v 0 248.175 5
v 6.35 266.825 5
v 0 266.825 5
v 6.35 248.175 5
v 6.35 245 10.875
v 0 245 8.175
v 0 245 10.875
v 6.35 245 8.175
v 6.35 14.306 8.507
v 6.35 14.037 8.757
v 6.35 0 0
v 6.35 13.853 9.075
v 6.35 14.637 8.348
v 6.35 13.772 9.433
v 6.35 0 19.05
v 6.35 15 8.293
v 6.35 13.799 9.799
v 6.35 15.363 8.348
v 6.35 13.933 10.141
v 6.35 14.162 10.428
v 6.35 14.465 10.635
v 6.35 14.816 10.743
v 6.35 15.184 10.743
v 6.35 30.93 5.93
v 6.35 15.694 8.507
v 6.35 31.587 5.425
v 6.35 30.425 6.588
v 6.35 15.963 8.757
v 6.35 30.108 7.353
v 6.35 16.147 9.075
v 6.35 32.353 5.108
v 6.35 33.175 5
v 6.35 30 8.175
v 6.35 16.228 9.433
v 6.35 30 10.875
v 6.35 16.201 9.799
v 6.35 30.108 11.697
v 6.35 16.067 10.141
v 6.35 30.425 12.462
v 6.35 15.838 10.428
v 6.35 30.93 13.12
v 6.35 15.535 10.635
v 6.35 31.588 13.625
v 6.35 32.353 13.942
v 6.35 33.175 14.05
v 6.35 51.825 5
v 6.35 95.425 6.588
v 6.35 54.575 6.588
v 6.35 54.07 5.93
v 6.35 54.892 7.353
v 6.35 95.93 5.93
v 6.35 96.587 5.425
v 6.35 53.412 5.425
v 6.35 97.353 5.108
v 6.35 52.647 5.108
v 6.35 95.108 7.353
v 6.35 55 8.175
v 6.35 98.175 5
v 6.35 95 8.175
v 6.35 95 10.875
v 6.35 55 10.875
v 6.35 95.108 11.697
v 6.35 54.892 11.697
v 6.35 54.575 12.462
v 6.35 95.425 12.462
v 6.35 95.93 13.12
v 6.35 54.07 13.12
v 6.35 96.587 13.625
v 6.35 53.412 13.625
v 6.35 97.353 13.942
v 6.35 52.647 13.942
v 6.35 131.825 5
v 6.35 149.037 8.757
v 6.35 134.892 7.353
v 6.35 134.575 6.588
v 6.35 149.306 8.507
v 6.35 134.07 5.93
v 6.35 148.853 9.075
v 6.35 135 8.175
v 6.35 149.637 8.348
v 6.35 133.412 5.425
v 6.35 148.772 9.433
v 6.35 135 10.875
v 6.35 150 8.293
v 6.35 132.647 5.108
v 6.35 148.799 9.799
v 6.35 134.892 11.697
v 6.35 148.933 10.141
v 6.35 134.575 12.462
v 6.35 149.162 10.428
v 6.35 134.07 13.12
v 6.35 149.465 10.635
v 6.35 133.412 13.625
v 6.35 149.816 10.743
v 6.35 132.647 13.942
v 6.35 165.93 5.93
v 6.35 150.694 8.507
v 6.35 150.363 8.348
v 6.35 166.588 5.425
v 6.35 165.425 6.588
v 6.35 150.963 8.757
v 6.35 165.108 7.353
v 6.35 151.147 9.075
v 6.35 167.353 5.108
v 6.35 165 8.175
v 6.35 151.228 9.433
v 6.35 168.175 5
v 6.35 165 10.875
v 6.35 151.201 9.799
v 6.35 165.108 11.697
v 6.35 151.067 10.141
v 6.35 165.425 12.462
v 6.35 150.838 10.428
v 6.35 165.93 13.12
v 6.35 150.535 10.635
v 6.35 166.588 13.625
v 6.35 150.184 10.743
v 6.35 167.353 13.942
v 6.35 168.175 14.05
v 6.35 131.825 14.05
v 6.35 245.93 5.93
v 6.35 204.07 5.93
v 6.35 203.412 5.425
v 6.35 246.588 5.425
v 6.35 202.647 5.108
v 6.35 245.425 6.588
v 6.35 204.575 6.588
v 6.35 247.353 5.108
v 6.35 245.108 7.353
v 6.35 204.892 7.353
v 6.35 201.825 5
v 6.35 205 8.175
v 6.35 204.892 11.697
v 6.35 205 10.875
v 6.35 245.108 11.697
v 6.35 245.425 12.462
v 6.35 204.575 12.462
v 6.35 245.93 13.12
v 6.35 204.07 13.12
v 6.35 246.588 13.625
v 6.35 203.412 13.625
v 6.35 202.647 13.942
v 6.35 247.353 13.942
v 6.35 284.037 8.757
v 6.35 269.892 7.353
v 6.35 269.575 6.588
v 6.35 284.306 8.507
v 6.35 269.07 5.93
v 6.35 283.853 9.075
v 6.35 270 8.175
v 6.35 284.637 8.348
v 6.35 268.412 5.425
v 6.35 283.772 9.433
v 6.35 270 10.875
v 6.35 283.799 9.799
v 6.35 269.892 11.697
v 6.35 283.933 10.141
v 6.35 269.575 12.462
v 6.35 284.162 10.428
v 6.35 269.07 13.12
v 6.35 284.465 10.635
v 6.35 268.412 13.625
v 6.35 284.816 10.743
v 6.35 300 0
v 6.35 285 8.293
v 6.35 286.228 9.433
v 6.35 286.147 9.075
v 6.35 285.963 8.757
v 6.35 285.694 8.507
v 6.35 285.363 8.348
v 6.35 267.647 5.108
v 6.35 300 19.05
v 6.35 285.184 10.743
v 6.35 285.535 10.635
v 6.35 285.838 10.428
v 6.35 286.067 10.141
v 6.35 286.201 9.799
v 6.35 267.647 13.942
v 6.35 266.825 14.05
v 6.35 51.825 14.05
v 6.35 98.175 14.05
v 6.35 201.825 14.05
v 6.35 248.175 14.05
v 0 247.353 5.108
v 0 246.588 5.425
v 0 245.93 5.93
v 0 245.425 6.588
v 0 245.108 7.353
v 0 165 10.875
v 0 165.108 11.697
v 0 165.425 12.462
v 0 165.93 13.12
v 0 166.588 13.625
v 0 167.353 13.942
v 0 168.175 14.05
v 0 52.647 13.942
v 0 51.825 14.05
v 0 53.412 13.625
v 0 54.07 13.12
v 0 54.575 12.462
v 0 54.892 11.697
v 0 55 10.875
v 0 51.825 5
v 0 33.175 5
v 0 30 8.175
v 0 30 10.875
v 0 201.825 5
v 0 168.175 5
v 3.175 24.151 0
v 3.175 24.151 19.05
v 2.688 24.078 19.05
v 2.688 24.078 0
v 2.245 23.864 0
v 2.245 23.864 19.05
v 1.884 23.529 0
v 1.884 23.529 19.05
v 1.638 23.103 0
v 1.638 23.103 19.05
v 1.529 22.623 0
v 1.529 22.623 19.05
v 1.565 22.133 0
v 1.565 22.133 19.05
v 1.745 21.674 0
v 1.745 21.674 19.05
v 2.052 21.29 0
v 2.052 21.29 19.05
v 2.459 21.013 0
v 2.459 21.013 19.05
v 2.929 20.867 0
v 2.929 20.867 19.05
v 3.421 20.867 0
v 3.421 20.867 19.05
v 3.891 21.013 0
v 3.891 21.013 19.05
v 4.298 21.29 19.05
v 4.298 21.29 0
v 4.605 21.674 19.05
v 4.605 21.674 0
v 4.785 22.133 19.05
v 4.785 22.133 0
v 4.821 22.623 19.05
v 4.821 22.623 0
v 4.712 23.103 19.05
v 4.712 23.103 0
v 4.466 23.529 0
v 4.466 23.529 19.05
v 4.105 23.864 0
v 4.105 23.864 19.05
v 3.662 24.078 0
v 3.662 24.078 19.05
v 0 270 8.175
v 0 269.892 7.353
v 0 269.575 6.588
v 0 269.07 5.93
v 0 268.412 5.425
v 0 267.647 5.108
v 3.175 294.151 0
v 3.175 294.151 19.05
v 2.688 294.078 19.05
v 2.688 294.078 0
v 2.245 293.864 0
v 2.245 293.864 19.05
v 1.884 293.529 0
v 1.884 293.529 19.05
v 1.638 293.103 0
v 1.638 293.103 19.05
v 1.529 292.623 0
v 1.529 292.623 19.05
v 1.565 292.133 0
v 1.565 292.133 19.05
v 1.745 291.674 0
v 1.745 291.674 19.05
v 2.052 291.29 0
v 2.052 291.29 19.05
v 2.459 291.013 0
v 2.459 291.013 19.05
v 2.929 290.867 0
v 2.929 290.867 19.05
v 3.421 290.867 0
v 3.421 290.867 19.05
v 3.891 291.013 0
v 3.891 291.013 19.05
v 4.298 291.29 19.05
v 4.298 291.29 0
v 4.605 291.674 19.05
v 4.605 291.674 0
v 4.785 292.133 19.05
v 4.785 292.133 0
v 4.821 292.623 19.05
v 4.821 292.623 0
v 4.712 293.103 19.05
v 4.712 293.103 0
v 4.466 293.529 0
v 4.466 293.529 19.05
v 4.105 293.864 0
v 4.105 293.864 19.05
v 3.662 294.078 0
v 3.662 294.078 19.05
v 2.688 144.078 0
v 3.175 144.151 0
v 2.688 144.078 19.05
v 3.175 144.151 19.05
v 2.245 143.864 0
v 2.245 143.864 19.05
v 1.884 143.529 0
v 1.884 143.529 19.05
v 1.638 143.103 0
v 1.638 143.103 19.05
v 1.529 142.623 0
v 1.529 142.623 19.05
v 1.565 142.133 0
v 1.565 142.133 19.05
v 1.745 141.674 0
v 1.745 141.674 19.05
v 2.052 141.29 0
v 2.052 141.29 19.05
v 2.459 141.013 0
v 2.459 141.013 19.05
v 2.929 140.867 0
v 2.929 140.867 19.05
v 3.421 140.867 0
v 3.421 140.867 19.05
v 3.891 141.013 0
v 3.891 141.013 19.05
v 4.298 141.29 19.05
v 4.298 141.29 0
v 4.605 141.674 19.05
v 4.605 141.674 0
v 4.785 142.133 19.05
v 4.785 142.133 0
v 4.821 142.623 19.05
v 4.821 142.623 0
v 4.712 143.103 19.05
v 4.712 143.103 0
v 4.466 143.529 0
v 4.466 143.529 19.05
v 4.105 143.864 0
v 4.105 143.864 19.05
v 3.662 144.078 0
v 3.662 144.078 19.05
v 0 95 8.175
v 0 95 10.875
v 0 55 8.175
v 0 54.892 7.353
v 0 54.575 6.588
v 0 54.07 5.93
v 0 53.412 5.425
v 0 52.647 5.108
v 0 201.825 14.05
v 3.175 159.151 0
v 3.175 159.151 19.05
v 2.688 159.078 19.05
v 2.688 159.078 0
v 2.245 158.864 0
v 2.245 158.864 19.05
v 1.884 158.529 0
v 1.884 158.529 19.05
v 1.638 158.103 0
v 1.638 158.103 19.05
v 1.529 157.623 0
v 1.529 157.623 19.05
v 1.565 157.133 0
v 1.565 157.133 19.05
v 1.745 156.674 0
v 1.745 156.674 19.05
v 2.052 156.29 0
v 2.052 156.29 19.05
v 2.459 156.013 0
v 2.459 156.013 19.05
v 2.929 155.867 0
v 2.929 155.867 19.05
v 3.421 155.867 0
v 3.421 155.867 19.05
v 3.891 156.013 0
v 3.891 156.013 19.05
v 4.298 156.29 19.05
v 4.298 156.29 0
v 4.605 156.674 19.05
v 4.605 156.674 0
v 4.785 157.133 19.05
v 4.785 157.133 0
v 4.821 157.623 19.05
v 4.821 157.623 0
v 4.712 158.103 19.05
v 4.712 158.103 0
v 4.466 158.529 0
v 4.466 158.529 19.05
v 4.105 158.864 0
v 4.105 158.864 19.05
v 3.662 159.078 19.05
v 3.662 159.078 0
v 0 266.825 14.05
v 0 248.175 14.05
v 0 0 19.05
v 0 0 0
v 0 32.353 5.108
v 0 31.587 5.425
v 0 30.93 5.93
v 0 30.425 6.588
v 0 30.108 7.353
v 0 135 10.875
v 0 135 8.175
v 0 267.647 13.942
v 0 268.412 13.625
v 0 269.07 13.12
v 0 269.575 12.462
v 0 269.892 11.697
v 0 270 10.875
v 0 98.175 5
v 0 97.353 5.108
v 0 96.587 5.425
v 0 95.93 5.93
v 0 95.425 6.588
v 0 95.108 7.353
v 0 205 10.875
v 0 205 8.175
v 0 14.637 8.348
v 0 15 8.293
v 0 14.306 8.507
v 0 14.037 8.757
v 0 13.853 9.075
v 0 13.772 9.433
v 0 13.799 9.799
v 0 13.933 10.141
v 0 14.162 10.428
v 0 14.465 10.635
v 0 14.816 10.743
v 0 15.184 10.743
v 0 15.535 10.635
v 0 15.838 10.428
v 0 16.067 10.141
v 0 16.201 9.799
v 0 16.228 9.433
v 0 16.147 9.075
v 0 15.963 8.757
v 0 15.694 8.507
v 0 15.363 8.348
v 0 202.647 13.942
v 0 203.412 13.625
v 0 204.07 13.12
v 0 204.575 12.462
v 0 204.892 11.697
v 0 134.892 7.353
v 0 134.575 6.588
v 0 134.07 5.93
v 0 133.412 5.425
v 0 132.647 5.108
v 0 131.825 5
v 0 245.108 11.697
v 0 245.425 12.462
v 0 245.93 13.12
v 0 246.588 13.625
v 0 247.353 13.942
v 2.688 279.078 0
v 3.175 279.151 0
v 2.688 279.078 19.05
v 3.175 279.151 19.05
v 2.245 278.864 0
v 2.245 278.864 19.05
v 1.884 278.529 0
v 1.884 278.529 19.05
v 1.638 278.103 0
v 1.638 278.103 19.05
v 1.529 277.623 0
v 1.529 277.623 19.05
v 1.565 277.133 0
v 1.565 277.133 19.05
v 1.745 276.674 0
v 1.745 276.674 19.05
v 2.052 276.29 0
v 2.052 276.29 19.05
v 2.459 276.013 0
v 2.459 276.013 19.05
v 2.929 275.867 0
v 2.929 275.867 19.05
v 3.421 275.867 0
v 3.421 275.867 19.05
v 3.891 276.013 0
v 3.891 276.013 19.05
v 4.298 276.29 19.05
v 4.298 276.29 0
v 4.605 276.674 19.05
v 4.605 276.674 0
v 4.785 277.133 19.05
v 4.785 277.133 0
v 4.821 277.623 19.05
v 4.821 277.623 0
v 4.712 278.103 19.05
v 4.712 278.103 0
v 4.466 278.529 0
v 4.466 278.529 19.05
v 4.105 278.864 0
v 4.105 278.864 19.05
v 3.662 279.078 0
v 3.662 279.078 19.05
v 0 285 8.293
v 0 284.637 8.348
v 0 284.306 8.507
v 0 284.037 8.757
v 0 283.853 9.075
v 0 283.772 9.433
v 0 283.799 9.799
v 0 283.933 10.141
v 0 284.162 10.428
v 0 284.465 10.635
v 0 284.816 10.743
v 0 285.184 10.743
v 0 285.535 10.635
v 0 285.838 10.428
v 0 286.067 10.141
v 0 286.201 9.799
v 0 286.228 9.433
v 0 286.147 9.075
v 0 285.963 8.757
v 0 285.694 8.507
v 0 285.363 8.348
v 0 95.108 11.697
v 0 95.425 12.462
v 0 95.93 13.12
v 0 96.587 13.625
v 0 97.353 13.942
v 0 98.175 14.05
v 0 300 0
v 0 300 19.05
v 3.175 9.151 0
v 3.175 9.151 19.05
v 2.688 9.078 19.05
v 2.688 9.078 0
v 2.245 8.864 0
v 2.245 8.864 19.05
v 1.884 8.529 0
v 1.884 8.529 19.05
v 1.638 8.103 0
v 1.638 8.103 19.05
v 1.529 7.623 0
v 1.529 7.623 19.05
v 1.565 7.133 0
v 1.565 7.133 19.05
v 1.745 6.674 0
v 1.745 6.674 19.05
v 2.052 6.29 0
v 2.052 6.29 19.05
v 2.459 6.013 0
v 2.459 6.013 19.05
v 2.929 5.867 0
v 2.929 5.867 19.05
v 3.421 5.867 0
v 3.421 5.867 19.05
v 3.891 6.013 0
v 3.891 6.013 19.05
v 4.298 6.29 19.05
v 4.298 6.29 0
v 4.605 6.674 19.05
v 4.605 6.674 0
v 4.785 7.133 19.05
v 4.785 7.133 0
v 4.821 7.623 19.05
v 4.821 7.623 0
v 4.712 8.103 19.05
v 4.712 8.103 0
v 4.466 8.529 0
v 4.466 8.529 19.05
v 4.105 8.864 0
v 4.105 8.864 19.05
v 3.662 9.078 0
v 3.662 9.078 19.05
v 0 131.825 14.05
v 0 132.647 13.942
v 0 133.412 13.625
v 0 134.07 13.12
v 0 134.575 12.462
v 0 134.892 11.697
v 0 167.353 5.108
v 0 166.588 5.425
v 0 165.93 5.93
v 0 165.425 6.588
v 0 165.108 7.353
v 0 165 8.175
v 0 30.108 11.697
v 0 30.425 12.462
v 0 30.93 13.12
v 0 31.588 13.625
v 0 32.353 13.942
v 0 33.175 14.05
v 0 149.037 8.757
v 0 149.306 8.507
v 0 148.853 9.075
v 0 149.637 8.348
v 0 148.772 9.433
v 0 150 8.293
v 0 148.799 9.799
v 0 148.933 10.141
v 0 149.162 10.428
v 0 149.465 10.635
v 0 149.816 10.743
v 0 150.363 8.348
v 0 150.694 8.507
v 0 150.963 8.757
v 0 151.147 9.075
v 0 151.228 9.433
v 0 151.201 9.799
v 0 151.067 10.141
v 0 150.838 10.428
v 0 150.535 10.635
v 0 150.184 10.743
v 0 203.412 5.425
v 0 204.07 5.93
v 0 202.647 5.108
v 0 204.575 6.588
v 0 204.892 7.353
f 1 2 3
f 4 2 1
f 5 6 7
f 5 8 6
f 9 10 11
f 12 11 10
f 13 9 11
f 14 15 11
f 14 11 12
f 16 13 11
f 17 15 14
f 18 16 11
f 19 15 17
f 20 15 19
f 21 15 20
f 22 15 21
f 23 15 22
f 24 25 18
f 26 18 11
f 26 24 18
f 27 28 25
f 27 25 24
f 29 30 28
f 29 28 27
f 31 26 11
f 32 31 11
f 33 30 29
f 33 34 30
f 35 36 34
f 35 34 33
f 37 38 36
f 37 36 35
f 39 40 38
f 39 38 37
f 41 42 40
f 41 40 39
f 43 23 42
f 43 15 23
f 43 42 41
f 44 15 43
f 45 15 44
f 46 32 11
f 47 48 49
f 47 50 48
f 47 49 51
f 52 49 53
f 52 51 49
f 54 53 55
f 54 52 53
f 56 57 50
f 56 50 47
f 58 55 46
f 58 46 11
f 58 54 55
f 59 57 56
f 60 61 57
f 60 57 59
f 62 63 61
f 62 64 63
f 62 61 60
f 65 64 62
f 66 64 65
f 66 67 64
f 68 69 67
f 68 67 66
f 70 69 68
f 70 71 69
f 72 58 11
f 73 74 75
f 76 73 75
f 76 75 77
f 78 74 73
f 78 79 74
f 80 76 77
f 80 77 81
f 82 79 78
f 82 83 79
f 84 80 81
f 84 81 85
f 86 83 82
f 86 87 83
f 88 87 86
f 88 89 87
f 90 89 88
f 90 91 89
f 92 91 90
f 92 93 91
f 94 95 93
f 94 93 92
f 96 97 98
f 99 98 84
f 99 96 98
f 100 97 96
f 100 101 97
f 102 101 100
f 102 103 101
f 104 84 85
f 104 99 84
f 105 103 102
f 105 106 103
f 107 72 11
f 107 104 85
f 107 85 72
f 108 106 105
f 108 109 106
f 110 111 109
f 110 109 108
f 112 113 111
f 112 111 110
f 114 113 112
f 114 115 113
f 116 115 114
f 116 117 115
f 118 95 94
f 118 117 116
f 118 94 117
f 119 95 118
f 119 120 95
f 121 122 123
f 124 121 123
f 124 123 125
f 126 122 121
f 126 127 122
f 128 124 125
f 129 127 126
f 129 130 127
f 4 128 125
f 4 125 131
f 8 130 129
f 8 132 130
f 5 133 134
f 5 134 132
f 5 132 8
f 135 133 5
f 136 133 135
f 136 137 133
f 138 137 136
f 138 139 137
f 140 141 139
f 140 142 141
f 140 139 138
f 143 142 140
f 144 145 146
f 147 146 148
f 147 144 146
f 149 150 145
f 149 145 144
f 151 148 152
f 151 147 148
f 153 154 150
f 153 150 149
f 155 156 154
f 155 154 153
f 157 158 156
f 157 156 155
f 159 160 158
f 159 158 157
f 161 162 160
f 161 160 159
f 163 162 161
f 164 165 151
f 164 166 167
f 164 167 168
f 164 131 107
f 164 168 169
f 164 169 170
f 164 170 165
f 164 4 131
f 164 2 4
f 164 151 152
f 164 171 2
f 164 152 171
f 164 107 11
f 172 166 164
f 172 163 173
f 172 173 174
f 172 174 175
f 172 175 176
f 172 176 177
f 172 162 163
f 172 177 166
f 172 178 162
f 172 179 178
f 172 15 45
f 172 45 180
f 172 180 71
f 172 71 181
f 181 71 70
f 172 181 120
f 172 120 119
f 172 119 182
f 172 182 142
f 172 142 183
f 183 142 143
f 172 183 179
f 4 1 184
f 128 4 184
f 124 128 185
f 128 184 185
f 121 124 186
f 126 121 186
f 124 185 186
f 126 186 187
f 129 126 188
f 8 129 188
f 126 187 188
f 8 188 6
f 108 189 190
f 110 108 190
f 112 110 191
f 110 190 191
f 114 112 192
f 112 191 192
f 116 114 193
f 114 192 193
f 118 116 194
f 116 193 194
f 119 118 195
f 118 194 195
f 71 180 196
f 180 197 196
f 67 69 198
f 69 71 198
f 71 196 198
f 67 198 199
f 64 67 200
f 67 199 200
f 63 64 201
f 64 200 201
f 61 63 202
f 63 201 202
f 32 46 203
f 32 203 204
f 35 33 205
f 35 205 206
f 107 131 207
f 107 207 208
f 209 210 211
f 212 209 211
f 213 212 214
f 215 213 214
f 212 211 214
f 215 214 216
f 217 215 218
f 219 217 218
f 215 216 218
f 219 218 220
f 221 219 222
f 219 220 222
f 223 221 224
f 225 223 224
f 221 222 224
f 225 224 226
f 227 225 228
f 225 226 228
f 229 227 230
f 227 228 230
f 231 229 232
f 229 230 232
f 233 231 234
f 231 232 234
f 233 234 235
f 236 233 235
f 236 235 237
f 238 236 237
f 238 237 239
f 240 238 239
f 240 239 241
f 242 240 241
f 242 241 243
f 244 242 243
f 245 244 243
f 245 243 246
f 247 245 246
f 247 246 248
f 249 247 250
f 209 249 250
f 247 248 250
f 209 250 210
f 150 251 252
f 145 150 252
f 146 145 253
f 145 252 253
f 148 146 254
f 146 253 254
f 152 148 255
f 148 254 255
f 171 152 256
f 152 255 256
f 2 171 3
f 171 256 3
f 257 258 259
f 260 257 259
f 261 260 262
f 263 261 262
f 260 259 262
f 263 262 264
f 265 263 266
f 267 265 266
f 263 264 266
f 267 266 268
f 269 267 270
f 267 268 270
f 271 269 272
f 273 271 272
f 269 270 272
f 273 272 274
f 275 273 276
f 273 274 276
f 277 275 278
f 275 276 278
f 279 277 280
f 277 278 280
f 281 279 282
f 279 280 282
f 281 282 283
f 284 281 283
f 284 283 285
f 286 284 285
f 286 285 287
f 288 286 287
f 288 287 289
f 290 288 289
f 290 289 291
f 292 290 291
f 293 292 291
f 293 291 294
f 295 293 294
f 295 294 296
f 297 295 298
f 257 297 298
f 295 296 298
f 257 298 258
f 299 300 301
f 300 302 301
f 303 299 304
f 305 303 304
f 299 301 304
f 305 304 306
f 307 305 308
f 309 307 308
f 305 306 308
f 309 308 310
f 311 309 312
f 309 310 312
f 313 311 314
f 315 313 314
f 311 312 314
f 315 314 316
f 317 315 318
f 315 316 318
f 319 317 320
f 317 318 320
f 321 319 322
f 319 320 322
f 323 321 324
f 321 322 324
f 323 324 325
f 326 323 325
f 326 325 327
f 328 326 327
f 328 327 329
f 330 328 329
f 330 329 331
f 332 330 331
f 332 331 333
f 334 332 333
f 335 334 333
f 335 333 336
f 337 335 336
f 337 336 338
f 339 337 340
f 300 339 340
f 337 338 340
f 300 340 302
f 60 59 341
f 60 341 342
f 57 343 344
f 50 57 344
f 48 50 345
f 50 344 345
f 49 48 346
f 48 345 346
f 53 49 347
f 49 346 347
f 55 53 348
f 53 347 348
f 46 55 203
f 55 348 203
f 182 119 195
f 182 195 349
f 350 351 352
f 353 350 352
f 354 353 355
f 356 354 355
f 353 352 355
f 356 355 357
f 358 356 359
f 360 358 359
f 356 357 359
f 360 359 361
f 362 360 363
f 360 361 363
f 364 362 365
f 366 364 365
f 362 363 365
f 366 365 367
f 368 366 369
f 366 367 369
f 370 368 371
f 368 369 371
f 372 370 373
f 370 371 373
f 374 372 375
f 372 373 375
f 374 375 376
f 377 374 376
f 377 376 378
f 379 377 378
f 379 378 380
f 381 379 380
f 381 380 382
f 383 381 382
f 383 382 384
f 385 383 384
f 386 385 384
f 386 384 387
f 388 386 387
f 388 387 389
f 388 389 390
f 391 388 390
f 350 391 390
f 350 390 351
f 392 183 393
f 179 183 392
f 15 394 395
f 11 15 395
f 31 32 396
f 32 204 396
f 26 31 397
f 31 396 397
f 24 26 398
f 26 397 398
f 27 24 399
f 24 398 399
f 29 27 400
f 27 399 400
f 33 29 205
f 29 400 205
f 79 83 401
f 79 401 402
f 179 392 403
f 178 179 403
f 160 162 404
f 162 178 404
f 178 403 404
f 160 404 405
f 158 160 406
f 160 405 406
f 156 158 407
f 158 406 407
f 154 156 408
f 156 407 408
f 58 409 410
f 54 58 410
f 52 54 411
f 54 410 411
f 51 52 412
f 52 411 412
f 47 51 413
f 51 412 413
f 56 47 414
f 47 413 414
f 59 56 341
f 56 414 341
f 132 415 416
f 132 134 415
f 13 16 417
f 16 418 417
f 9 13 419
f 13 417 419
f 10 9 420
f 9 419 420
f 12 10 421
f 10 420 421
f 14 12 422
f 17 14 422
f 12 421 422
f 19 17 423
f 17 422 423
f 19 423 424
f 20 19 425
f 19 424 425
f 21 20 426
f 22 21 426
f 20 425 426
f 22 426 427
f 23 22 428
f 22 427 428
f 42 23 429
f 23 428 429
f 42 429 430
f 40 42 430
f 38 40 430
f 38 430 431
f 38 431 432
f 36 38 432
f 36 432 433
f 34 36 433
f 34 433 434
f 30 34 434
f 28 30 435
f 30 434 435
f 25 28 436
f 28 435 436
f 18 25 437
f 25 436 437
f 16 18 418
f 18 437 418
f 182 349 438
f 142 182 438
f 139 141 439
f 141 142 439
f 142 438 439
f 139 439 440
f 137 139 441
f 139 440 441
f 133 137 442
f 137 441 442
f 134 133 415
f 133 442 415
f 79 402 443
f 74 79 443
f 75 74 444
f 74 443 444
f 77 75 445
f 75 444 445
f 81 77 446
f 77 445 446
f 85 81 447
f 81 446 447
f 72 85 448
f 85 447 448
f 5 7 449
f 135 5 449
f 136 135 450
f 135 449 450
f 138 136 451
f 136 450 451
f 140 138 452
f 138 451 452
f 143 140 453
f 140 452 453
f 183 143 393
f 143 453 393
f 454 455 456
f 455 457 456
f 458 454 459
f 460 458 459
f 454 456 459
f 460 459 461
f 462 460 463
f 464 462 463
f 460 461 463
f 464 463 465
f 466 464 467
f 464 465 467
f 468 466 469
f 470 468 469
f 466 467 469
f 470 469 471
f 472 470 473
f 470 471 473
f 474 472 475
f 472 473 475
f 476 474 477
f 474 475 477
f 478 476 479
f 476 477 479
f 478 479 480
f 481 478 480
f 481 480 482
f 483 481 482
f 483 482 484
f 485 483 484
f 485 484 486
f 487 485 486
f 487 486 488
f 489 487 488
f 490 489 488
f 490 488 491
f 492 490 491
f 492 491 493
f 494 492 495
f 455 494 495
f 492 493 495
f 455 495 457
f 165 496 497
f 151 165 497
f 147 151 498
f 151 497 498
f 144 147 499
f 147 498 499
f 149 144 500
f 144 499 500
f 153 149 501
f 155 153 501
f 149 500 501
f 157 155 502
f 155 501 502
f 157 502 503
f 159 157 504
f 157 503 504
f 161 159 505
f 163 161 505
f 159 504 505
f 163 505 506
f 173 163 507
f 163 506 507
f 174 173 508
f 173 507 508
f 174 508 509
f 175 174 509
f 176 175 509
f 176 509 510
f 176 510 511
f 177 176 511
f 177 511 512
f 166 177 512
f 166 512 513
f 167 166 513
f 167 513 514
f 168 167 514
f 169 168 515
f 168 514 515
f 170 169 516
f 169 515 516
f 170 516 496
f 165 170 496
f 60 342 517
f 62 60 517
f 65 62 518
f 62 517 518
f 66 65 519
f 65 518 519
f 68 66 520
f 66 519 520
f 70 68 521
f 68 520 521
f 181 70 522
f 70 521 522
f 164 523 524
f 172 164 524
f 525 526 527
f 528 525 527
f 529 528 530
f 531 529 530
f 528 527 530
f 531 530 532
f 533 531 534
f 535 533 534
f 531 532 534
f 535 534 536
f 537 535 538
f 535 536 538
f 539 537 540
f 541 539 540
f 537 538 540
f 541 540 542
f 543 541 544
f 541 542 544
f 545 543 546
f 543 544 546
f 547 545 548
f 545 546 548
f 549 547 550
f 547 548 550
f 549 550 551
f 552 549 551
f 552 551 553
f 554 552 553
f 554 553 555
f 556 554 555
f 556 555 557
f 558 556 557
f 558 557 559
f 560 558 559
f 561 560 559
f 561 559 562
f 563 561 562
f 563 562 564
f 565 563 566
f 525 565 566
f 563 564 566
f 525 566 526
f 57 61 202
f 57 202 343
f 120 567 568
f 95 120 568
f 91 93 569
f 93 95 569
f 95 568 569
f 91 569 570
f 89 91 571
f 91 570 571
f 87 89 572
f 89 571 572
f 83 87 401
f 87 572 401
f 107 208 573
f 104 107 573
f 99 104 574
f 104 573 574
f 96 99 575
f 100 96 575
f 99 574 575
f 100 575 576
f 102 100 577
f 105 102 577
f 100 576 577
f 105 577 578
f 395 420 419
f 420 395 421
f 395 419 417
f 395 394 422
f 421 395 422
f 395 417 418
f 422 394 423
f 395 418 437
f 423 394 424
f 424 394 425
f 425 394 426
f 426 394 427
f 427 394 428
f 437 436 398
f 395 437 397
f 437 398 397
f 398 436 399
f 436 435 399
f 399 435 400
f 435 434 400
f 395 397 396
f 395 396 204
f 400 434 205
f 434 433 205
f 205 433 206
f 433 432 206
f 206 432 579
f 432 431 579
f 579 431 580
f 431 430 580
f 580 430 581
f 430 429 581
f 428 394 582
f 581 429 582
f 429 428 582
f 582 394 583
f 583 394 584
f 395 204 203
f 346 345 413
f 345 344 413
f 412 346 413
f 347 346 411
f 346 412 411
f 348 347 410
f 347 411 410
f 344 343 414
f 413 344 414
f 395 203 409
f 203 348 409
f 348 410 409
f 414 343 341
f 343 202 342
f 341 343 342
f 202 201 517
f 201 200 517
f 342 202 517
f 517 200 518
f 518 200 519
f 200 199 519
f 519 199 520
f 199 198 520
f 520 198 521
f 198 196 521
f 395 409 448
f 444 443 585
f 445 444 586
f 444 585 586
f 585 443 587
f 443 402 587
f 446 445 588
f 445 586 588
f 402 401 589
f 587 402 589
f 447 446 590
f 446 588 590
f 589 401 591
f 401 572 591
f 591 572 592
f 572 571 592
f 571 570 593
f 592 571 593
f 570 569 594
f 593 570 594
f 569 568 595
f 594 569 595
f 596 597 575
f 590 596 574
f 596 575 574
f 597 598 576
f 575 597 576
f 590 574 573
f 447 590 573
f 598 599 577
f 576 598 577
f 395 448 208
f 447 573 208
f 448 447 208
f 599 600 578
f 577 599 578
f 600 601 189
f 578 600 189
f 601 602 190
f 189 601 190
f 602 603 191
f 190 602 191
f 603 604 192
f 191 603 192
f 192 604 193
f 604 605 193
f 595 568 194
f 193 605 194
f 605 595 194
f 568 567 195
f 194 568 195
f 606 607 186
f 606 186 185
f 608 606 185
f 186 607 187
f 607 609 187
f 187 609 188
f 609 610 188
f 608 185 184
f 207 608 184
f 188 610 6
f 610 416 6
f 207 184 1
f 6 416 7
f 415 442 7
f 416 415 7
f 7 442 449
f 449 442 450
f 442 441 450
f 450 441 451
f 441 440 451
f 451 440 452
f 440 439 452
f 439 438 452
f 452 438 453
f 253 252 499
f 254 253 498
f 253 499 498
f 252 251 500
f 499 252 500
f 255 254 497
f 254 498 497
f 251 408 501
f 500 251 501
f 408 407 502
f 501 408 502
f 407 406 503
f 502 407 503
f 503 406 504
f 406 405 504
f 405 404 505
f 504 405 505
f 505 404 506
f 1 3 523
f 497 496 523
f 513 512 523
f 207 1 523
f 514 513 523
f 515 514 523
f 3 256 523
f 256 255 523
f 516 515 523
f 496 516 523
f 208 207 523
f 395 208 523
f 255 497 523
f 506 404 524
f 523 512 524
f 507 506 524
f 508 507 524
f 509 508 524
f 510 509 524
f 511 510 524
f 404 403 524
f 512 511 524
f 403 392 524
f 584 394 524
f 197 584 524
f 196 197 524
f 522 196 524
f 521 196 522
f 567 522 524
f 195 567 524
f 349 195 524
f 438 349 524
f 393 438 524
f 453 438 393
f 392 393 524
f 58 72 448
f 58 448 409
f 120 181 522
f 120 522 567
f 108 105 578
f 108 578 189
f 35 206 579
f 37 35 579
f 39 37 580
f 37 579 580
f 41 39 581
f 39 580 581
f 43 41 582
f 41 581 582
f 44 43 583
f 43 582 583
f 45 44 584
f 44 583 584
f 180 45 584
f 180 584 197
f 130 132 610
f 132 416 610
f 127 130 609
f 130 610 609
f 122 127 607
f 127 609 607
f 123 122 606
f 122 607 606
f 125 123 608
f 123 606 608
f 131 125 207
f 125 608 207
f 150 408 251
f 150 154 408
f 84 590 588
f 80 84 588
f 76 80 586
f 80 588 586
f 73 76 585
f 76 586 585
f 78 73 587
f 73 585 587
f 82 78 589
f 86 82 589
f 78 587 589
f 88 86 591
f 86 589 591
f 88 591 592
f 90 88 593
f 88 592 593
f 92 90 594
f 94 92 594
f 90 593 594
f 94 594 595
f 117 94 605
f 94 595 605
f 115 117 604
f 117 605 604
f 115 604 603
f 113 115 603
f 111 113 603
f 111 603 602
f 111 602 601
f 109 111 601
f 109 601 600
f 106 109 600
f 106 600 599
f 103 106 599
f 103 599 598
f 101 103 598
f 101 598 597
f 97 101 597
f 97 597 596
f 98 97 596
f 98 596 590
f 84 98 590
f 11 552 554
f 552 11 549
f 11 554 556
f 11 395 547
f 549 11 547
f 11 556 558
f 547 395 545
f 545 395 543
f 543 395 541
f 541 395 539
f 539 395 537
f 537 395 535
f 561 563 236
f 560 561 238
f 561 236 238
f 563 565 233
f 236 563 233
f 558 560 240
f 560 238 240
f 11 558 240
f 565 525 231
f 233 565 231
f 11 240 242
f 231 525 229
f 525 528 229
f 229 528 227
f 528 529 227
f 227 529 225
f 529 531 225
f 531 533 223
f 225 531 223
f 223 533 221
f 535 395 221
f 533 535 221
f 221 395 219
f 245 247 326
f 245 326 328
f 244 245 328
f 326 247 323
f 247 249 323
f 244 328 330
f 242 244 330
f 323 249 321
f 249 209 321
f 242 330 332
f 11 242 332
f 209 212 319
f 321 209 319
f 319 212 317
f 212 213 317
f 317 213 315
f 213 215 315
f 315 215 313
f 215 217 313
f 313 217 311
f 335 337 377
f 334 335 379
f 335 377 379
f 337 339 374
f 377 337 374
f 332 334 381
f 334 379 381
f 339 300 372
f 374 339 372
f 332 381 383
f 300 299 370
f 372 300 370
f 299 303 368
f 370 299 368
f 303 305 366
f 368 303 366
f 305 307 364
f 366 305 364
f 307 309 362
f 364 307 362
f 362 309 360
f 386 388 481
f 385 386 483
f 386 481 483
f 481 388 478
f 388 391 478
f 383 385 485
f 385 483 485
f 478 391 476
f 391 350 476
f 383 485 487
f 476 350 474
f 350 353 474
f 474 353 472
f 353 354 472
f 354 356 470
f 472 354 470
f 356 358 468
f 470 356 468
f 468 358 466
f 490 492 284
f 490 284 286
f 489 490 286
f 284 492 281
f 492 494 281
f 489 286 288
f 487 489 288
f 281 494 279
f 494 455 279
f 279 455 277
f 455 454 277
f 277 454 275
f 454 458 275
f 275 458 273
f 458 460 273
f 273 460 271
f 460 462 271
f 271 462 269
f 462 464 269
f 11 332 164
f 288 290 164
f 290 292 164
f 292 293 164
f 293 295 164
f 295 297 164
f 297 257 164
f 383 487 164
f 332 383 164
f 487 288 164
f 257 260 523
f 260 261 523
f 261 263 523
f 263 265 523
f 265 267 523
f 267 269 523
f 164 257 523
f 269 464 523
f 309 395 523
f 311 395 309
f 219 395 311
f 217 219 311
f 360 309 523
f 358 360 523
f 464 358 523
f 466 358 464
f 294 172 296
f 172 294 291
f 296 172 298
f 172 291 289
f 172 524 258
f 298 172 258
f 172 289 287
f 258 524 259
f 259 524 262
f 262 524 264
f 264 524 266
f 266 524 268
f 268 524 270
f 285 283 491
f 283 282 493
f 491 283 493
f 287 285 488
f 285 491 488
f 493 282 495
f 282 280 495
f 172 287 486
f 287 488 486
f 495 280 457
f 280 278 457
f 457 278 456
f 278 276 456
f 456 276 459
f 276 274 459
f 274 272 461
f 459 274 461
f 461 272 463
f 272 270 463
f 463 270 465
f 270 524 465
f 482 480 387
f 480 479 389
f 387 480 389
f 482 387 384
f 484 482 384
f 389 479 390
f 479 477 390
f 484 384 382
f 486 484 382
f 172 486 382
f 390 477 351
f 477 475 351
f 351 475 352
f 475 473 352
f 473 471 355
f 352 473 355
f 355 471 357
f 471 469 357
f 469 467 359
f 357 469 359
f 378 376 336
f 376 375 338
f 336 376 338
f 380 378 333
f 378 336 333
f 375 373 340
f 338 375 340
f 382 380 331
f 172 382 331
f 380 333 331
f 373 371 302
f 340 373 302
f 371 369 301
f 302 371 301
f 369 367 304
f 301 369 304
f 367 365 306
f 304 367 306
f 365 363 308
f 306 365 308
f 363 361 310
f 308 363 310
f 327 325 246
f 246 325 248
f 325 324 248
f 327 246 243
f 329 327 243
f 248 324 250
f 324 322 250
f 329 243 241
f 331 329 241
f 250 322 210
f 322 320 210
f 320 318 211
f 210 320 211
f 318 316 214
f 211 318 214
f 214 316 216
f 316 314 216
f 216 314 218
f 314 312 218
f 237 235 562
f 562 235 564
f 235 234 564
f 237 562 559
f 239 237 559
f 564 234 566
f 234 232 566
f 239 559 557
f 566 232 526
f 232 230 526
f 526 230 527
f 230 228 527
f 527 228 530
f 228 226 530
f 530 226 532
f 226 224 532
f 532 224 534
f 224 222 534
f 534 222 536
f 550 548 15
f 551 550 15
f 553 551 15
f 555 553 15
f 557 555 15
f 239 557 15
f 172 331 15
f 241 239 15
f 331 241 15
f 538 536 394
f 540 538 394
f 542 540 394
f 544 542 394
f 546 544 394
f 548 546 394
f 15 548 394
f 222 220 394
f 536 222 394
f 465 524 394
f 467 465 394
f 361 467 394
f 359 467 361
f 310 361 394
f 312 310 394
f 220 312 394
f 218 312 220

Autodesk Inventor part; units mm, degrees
ref_plane "YZ Plane" through (0, 0, 0) normal (1, 0, 0) x (0, 1, 0)
ref_plane "XZ Plane" through (0, 0, 0) normal (0, 1, 0) x (-1, 0, 0)
ref_plane "XY Plane" through (0, 0, 0) normal (0, 0, 1) x (1, 0, 0)
sketch "Sketch1" plane through (0, 0, 0) normal (1, 0, 0) x (0, 1, 0)
  line L0 (0, 0) -> (300, 0)
  line L1 (300, 0) -> (300, 19.05)
  line L2 (300, 19.05) -> (0, 19.05)
  line L3 (0, 19.05) -> (0, 0)
  dimension "d0" = 300
  dimension "d1" = 19.05
extrude "Extrusion1" add sketch "Sketch1" along normal blind 6.35
sketch "Sketch2" plane through (6.35, 0, 0) normal (1, 0, 0) x (0, 0, -1)
  line L0 (0, 300) -> (-19.05, 300) projected
  line L1 (-19.05, 300) -> (-19.05, 0) projected
  line L2 (-19.05, 0) -> (0, 0) projected
  point P0 (-9.525, 285)
  point P1 (-9.525, 150)
  point P2 (-9.525, 15)
  dimension "d4" = 15
  dimension "d5" = 19.05
  dimension "d6" = 9.525
  dimension "d7" = 15
  dimension "d8" = 9.525
  dimension "d9" = 9.525
  dimension "d10" = 150
hole "Hole1" at (6.35, 285, 9.525) at (6.35, 150, 9.525) at (6.35, 15, 9.525) direction (-1, 0, 0) diameter 2.4638 end through all
sketch "Sketch5" plane through (6.35, 0, 0) normal (1, 0, 0) x (0, 0, -1)
  line L0 (-14.05, 270) -> (-5, 270)
  line L1 (-5, 270) -> (-5, 245)
  line L2 (-5, 245) -> (-14.05, 245)
  line L3 (-14.05, 245) -> (-14.05, 270)
  line L4 (-14.05, 205) -> (-5, 205)
  line L5 (-5, 205) -> (-5, 165)
  line L6 (-5, 165) -> (-14.05, 165)
  line L7 (-14.05, 165) -> (-14.05, 205)
  line L8 (-14.05, 135) -> (-5, 135)
  line L9 (-5, 135) -> (-5, 95)
  line L10 (-5, 95) -> (-14.05, 95)
  line L11 (-14.05, 95) -> (-14.05, 135)
  line L12 (-14.05, 55) -> (-5, 55)
  line L13 (-5, 55) -> (-5, 30)
  line L14 (-5, 30) -> (-14.05, 30)
  line L15 (-14.05, 30) -> (-14.05, 55)
  line L16 (0, 0) -> (0, 300) projected
  line L17 (-19.05, 300) -> (-19.05, 0) projected
  line L18 (0, 300) -> (-19.05, 300) projected
  line L19 (-19.05, 0) -> (0, 0) projected
  dimension "d44" = 5
  dimension "d45" = 5
  dimension "d46" = 30
  dimension "d47" = 30
  dimension "d48" = 55
  dimension "d49" = 95
  dimension "d50" = 135
  dimension "d51" = 55
  dimension "d52" = 95
  dimension "d53" = 135
extrude "Extrusion2" cut sketch "Sketch5" against normal through all contours L0 L1 L2 L3 | L4 L5 L6 L7 | L8 L9 L10 L11 | L12 L13 L14 L15
fillet "Fillet1" radius 3.175 1 edges at (3.175, 270, 5)
fillet "Fillet2" radius 3.175 1 edges at (3.175, 270, 14.05)
fillet "Fillet3" radius 3.175 1 edges at (3.175, 245, 5)
fillet "Fillet4" radius 3.175 1 edges at (3.175, 245, 14.05)
fillet "Fillet5" radius 3.175 1 edges at (3.175, 205, 5)
fillet "Fillet6" radius 3.175 1 edges at (3.175, 205, 14.05)
fillet "Fillet7" radius 3.175 1 edges at (3.175, 165, 5)
fillet "Fillet8" radius 3.175 1 edges at (3.175, 165, 14.05)
fillet "Fillet9" radius 3.175 1 edges at (3.175, 95, 5)
fillet "Fillet10" radius 3.175 1 edges at (3.175, 135, 5)
fillet "Fillet11" radius 3.175 1 edges at (3.175, 135, 14.05)
fillet "Fillet12" radius 3.175 1 edges at (3.175, 95, 14.05)
fillet "Fillet13" radius 3.175 1 edges at (3.175, 55, 5)
fillet "Fillet14" radius 3.175 1 edges at (3.175, 55, 14.05)
fillet "Fillet15" radius 3.175 1 edges at (3.175, 30, 14.05)
fillet "Fillet16" radius 3.175 1 edges at (3.175, 30, 5)
sketch "Sketch7" plane through (0, 0, 0) normal (0, 0, -1) x (-1, 0, 0)
  line L0 (0, 300) -> (-6.35, 300) projected
  line L1 (0, 0) -> (-6.35, 0) projected
  line L2 (-6.35, 0) -> (-6.35, 300) projected
  point P0 (-3.175, 7.5)
  point P1 (-3.175, 22.5)
  point P2 (-3.175, 142.5)
  point P3 (-3.175, 157.5)
  point P4 (-3.175, 277.5)
  point P5 (-3.175, 292.5)
  dimension "d72" = 7.5
  dimension "d73" = 22.5
  dimension "d74" = 142.5
  dimension "d78" = 7.5
  dimension "d79" = 22.5
  dimension "d82" = 142.5
  dimension "d83" = 6.35
  dimension "d84" = 3.175
  dimension "d85" = 3.175
  dimension "d88" = 3.175
  dimension "d89" = 3.175
  dimension "d92" = 3.175
  dimension "d93" = 3.175
hole "Hole3" at (3.175, 7.5, 0) at (3.175, 22.5, 0) at (3.175, 142.5, 0) at (3.175, 157.5, 0) at (3.175, 277.5, 0) at (3.175, 292.5, 0) direction (0, 0, 1) diameter 3.302 end through all thread size "8-32 UNC" class "2B" standard "ANSI Unified Screw Threads"
equation "\"d6\" = 0.5 * d5"
equation "\"d7\" = d4"
equation "\"d8\" = d6"
equation "\"d9\" = d6"
equation "\"d45\" = d44"
equation "\"d47\" = d46"
equation "\"d51\" = d48"
equation "\"d52\" = d49"
equation "\"d53\" = d50"
equation "\"d78\" = d72"
equation "\"d79\" = d73"
equation "\"d82\" = d74"
equation "\"d84\" = 0.5 * d83"
equation "\"d85\" = d84"
equation "\"d88\" = d87"
equation "\"d89\" = d88"
equation "\"d92\" = d91"
equation "\"d93\" = d91"
equation "\"d87\" = d84"
equation "\"d91\" = d89"
properties part number "slides"
